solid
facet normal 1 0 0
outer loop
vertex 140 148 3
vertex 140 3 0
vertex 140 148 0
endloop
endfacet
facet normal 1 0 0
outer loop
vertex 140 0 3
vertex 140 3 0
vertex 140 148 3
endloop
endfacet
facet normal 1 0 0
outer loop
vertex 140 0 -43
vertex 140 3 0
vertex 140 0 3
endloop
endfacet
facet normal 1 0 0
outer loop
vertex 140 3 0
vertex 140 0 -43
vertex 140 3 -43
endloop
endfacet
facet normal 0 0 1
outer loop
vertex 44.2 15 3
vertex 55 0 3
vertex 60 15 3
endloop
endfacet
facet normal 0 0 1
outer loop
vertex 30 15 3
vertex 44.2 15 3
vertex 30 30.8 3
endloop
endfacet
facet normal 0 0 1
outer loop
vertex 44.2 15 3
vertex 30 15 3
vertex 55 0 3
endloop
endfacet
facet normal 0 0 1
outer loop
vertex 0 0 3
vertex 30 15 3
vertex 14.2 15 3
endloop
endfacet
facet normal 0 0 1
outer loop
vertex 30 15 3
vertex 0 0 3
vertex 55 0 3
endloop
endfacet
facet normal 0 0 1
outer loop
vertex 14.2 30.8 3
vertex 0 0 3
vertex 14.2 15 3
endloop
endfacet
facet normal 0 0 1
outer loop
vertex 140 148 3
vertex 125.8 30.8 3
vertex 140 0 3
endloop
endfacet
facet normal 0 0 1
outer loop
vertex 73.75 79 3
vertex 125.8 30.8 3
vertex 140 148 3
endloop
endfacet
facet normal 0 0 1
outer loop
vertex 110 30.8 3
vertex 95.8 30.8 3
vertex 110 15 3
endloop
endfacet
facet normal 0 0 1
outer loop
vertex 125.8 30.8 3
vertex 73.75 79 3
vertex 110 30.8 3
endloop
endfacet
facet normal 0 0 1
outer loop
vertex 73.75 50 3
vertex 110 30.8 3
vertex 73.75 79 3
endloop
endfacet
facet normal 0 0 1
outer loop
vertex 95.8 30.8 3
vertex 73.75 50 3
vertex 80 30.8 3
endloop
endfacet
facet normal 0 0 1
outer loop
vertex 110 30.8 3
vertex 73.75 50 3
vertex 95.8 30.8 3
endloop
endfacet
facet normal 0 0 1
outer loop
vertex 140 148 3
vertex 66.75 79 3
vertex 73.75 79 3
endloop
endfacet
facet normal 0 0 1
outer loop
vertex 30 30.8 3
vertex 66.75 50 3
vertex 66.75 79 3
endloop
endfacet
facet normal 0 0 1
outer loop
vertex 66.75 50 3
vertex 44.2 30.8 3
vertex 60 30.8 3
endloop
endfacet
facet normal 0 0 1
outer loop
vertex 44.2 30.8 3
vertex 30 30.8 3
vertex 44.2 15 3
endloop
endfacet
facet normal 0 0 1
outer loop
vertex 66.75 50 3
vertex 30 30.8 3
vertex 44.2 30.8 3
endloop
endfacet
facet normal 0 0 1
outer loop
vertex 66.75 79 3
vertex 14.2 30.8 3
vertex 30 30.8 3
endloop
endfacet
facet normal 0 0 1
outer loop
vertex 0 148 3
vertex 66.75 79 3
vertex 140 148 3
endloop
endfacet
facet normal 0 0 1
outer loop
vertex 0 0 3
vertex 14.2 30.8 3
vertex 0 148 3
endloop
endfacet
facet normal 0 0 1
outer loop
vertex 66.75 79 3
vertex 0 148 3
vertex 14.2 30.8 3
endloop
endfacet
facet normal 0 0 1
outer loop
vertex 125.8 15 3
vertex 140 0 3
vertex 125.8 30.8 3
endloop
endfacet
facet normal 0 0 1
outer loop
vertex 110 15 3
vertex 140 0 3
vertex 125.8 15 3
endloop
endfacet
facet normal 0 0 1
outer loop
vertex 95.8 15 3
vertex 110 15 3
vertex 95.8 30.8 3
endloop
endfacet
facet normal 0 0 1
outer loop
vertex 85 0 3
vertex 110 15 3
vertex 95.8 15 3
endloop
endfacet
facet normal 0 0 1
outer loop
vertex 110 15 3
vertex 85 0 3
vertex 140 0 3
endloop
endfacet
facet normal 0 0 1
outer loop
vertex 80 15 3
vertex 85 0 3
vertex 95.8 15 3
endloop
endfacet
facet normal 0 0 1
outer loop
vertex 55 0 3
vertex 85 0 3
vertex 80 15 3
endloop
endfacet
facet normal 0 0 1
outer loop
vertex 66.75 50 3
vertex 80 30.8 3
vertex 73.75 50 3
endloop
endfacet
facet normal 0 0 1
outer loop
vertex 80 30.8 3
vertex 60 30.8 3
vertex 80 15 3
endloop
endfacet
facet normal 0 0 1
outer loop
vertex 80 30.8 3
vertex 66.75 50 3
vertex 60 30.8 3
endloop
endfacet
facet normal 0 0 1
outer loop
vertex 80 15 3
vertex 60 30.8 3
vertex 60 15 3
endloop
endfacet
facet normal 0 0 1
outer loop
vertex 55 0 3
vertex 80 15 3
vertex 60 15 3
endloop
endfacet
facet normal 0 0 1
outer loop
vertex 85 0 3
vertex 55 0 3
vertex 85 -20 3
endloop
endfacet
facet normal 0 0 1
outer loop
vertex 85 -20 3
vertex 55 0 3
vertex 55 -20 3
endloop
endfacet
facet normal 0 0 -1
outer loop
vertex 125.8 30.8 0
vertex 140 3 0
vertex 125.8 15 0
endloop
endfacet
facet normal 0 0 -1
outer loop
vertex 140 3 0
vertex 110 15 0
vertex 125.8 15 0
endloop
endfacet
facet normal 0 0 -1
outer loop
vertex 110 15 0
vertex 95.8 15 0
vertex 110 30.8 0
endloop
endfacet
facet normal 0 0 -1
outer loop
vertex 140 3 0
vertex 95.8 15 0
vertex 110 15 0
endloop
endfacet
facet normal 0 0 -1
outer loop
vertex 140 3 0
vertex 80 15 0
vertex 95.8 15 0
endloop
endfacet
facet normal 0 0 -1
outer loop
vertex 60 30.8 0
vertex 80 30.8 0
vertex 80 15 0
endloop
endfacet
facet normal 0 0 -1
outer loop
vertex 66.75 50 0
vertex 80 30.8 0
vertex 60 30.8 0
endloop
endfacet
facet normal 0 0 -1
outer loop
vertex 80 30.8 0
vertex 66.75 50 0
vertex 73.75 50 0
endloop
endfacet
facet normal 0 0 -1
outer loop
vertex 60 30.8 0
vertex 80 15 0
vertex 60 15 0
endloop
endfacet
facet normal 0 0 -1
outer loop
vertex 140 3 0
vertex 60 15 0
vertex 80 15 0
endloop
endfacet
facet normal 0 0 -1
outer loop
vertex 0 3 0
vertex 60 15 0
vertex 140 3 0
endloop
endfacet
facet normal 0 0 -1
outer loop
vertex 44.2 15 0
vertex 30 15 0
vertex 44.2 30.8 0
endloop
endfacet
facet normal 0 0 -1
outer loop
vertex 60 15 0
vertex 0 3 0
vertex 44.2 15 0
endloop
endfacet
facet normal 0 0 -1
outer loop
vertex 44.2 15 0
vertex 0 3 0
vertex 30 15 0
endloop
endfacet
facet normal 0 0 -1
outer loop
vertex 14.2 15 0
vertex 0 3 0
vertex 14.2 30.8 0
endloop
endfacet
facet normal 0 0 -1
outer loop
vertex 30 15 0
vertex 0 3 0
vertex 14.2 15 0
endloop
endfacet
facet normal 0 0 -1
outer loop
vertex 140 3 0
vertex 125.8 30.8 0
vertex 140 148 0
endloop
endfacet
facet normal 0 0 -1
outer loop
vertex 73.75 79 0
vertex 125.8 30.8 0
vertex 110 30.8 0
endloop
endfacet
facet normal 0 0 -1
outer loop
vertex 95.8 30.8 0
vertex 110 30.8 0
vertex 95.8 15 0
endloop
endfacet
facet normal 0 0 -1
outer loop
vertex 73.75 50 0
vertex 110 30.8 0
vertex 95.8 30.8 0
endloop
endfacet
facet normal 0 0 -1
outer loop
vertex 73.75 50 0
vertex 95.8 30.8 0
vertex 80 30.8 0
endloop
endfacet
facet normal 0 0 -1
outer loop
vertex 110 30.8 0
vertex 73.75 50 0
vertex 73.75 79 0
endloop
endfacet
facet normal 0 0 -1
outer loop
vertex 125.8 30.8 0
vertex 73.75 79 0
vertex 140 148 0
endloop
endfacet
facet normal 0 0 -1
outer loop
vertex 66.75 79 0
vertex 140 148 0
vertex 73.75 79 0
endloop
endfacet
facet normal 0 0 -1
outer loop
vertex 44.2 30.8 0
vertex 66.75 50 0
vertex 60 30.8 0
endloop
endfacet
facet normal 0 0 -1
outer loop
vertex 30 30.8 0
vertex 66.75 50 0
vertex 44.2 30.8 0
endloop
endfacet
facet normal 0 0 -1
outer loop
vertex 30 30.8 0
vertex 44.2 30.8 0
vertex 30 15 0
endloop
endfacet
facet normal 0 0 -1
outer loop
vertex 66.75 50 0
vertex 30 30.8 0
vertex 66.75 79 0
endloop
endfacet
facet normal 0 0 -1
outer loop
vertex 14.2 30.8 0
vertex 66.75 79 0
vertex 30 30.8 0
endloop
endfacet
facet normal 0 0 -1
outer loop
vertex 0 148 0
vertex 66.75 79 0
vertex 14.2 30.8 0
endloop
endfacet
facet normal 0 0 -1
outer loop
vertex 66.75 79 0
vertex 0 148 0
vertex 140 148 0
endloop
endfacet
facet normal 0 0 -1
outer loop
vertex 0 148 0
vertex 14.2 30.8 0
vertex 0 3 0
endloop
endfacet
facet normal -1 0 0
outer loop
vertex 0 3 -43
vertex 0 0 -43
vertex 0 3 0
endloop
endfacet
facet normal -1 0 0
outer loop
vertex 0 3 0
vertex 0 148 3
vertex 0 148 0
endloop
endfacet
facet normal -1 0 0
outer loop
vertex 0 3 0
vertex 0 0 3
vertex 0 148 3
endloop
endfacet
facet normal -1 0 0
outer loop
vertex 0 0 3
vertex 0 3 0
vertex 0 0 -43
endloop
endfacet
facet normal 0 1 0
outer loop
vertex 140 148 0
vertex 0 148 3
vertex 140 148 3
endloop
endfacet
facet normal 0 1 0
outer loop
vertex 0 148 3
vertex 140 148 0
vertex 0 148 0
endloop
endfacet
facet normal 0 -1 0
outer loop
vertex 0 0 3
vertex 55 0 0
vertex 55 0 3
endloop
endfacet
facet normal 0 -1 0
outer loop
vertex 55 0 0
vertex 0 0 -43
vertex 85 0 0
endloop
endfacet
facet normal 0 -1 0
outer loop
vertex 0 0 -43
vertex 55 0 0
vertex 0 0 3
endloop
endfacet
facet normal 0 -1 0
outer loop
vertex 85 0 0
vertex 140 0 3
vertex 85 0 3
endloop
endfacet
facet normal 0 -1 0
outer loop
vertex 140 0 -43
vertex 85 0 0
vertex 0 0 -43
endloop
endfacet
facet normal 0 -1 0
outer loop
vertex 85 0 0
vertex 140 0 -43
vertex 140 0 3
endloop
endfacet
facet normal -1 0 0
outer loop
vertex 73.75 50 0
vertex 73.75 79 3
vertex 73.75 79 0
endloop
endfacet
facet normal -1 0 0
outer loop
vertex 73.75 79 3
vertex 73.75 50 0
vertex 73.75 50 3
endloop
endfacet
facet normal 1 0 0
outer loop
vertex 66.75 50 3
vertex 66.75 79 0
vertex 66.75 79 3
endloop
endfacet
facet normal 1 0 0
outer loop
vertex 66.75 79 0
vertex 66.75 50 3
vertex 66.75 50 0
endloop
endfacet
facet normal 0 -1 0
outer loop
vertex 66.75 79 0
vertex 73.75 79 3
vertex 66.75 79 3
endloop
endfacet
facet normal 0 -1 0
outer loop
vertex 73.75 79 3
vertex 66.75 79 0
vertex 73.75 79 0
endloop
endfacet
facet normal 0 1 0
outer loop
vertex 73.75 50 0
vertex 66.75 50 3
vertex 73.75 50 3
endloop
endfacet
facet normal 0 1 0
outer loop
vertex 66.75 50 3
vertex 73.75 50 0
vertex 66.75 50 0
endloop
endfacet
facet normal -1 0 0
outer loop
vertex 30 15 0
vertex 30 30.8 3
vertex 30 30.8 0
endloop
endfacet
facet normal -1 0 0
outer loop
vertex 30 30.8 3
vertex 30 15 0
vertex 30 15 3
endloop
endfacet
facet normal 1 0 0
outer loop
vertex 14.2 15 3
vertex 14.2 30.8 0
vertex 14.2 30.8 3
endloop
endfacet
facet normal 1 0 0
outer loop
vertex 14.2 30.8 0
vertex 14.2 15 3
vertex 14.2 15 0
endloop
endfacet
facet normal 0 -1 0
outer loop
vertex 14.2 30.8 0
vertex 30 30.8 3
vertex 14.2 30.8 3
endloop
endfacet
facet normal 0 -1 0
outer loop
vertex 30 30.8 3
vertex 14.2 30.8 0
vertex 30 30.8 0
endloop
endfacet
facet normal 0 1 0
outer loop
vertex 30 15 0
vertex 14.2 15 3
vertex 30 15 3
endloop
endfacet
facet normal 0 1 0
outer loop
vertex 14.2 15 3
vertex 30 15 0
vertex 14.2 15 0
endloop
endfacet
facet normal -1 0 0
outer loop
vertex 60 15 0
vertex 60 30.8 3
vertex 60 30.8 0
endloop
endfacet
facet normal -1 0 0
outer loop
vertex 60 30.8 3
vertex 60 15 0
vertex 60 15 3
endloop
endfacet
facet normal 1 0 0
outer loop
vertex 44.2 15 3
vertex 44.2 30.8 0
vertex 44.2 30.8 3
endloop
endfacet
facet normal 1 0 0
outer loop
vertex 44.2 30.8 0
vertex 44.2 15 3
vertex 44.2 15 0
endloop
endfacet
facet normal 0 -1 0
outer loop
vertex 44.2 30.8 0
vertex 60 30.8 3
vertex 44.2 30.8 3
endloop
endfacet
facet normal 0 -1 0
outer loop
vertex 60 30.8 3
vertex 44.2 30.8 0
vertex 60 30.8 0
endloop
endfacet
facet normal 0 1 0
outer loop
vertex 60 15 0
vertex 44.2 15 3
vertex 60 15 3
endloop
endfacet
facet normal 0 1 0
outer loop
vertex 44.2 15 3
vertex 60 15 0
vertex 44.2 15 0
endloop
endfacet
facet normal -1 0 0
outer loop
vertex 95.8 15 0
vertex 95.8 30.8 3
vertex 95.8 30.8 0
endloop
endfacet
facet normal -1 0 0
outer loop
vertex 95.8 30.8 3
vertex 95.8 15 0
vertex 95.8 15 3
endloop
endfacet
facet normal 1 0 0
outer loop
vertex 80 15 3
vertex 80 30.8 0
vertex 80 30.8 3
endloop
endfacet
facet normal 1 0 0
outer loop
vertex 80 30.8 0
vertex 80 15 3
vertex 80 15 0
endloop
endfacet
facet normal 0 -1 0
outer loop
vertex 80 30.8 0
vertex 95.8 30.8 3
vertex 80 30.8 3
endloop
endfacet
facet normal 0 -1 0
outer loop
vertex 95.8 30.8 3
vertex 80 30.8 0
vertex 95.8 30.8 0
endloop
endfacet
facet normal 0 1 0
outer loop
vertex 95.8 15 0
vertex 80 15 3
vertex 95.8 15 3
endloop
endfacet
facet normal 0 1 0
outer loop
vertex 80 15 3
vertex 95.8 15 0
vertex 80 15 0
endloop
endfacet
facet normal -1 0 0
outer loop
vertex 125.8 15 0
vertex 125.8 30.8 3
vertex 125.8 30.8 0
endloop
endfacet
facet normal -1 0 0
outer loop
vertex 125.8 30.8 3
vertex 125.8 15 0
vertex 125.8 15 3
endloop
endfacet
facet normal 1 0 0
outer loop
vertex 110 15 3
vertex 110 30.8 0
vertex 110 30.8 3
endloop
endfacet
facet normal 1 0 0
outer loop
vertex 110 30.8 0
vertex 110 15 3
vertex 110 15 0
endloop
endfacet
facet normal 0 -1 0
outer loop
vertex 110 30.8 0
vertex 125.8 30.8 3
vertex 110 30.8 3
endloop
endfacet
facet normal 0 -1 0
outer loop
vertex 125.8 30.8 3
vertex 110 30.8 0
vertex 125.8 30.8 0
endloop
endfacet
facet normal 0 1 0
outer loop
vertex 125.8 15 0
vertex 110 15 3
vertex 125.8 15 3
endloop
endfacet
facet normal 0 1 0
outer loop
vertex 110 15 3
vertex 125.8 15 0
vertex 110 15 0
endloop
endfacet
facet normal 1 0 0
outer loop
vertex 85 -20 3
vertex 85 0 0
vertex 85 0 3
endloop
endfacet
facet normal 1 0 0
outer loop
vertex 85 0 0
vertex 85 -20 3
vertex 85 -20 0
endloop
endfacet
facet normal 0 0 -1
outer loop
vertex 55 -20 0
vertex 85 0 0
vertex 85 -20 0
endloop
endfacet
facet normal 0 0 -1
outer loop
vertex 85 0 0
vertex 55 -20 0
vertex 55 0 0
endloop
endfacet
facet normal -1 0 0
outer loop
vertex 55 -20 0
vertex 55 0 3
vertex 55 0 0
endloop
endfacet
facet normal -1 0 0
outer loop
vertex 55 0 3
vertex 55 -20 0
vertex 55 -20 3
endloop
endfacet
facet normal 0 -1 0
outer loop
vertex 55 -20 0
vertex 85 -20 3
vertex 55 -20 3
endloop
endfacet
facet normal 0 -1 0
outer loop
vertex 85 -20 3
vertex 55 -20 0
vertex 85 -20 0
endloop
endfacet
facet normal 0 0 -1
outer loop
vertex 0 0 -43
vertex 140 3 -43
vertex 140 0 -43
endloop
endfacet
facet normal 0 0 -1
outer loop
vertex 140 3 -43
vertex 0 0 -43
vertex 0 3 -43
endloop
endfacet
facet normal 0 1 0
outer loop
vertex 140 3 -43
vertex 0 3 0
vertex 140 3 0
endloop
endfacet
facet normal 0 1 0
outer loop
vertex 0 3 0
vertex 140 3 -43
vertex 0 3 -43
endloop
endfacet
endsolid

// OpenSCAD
/*
        ENAMEL PROJECT - MELANIE BALJKO
        MODELLING FOR VERSION 2
        CREATED BY: SHWETA DIXIT - 2017
        
        TITLE --- VERSION 2 - TOP LID SLIDER 
        
        (Measurements in mm)
        
*/

// Modelling the top lid slider
module slider_layer()
{
    
    difference()
    {
        cube([140, 148, 3]);  
    
        // Adding a hole for the braille cell
        translate([66.75, 50, 0])
        {
            cube([7, 29, 3]);
        }
        
        // Adding hole for button 1
        translate([14.2, 15, 0])
        {
            cube([15.8, 15.8, 3]);
        }
        
        // Adding hole for button 2
        translate([44.2, 15, 0])
        {
            cube([15.8, 15.8, 3]);
        }
        
        // Adding hole for button 3
        translate([80, 15, 0])
        {
            cube([15.8, 15.8, 3]);
        }
        
        // Adding hole for button 4
        translate([110, 15, 0])
        {
            cube([15.8, 15.8, 3]);
        }
    }
    
    // Adding the handle
    translate([55, -20, 0])
    {
        cube([30, 20, 3]);
    }
    
    // Adding the bottom closing area
    translate([0, 0, -43])
    {
        cube([140, 3 ,43]);
    }
}
slider_layer();
